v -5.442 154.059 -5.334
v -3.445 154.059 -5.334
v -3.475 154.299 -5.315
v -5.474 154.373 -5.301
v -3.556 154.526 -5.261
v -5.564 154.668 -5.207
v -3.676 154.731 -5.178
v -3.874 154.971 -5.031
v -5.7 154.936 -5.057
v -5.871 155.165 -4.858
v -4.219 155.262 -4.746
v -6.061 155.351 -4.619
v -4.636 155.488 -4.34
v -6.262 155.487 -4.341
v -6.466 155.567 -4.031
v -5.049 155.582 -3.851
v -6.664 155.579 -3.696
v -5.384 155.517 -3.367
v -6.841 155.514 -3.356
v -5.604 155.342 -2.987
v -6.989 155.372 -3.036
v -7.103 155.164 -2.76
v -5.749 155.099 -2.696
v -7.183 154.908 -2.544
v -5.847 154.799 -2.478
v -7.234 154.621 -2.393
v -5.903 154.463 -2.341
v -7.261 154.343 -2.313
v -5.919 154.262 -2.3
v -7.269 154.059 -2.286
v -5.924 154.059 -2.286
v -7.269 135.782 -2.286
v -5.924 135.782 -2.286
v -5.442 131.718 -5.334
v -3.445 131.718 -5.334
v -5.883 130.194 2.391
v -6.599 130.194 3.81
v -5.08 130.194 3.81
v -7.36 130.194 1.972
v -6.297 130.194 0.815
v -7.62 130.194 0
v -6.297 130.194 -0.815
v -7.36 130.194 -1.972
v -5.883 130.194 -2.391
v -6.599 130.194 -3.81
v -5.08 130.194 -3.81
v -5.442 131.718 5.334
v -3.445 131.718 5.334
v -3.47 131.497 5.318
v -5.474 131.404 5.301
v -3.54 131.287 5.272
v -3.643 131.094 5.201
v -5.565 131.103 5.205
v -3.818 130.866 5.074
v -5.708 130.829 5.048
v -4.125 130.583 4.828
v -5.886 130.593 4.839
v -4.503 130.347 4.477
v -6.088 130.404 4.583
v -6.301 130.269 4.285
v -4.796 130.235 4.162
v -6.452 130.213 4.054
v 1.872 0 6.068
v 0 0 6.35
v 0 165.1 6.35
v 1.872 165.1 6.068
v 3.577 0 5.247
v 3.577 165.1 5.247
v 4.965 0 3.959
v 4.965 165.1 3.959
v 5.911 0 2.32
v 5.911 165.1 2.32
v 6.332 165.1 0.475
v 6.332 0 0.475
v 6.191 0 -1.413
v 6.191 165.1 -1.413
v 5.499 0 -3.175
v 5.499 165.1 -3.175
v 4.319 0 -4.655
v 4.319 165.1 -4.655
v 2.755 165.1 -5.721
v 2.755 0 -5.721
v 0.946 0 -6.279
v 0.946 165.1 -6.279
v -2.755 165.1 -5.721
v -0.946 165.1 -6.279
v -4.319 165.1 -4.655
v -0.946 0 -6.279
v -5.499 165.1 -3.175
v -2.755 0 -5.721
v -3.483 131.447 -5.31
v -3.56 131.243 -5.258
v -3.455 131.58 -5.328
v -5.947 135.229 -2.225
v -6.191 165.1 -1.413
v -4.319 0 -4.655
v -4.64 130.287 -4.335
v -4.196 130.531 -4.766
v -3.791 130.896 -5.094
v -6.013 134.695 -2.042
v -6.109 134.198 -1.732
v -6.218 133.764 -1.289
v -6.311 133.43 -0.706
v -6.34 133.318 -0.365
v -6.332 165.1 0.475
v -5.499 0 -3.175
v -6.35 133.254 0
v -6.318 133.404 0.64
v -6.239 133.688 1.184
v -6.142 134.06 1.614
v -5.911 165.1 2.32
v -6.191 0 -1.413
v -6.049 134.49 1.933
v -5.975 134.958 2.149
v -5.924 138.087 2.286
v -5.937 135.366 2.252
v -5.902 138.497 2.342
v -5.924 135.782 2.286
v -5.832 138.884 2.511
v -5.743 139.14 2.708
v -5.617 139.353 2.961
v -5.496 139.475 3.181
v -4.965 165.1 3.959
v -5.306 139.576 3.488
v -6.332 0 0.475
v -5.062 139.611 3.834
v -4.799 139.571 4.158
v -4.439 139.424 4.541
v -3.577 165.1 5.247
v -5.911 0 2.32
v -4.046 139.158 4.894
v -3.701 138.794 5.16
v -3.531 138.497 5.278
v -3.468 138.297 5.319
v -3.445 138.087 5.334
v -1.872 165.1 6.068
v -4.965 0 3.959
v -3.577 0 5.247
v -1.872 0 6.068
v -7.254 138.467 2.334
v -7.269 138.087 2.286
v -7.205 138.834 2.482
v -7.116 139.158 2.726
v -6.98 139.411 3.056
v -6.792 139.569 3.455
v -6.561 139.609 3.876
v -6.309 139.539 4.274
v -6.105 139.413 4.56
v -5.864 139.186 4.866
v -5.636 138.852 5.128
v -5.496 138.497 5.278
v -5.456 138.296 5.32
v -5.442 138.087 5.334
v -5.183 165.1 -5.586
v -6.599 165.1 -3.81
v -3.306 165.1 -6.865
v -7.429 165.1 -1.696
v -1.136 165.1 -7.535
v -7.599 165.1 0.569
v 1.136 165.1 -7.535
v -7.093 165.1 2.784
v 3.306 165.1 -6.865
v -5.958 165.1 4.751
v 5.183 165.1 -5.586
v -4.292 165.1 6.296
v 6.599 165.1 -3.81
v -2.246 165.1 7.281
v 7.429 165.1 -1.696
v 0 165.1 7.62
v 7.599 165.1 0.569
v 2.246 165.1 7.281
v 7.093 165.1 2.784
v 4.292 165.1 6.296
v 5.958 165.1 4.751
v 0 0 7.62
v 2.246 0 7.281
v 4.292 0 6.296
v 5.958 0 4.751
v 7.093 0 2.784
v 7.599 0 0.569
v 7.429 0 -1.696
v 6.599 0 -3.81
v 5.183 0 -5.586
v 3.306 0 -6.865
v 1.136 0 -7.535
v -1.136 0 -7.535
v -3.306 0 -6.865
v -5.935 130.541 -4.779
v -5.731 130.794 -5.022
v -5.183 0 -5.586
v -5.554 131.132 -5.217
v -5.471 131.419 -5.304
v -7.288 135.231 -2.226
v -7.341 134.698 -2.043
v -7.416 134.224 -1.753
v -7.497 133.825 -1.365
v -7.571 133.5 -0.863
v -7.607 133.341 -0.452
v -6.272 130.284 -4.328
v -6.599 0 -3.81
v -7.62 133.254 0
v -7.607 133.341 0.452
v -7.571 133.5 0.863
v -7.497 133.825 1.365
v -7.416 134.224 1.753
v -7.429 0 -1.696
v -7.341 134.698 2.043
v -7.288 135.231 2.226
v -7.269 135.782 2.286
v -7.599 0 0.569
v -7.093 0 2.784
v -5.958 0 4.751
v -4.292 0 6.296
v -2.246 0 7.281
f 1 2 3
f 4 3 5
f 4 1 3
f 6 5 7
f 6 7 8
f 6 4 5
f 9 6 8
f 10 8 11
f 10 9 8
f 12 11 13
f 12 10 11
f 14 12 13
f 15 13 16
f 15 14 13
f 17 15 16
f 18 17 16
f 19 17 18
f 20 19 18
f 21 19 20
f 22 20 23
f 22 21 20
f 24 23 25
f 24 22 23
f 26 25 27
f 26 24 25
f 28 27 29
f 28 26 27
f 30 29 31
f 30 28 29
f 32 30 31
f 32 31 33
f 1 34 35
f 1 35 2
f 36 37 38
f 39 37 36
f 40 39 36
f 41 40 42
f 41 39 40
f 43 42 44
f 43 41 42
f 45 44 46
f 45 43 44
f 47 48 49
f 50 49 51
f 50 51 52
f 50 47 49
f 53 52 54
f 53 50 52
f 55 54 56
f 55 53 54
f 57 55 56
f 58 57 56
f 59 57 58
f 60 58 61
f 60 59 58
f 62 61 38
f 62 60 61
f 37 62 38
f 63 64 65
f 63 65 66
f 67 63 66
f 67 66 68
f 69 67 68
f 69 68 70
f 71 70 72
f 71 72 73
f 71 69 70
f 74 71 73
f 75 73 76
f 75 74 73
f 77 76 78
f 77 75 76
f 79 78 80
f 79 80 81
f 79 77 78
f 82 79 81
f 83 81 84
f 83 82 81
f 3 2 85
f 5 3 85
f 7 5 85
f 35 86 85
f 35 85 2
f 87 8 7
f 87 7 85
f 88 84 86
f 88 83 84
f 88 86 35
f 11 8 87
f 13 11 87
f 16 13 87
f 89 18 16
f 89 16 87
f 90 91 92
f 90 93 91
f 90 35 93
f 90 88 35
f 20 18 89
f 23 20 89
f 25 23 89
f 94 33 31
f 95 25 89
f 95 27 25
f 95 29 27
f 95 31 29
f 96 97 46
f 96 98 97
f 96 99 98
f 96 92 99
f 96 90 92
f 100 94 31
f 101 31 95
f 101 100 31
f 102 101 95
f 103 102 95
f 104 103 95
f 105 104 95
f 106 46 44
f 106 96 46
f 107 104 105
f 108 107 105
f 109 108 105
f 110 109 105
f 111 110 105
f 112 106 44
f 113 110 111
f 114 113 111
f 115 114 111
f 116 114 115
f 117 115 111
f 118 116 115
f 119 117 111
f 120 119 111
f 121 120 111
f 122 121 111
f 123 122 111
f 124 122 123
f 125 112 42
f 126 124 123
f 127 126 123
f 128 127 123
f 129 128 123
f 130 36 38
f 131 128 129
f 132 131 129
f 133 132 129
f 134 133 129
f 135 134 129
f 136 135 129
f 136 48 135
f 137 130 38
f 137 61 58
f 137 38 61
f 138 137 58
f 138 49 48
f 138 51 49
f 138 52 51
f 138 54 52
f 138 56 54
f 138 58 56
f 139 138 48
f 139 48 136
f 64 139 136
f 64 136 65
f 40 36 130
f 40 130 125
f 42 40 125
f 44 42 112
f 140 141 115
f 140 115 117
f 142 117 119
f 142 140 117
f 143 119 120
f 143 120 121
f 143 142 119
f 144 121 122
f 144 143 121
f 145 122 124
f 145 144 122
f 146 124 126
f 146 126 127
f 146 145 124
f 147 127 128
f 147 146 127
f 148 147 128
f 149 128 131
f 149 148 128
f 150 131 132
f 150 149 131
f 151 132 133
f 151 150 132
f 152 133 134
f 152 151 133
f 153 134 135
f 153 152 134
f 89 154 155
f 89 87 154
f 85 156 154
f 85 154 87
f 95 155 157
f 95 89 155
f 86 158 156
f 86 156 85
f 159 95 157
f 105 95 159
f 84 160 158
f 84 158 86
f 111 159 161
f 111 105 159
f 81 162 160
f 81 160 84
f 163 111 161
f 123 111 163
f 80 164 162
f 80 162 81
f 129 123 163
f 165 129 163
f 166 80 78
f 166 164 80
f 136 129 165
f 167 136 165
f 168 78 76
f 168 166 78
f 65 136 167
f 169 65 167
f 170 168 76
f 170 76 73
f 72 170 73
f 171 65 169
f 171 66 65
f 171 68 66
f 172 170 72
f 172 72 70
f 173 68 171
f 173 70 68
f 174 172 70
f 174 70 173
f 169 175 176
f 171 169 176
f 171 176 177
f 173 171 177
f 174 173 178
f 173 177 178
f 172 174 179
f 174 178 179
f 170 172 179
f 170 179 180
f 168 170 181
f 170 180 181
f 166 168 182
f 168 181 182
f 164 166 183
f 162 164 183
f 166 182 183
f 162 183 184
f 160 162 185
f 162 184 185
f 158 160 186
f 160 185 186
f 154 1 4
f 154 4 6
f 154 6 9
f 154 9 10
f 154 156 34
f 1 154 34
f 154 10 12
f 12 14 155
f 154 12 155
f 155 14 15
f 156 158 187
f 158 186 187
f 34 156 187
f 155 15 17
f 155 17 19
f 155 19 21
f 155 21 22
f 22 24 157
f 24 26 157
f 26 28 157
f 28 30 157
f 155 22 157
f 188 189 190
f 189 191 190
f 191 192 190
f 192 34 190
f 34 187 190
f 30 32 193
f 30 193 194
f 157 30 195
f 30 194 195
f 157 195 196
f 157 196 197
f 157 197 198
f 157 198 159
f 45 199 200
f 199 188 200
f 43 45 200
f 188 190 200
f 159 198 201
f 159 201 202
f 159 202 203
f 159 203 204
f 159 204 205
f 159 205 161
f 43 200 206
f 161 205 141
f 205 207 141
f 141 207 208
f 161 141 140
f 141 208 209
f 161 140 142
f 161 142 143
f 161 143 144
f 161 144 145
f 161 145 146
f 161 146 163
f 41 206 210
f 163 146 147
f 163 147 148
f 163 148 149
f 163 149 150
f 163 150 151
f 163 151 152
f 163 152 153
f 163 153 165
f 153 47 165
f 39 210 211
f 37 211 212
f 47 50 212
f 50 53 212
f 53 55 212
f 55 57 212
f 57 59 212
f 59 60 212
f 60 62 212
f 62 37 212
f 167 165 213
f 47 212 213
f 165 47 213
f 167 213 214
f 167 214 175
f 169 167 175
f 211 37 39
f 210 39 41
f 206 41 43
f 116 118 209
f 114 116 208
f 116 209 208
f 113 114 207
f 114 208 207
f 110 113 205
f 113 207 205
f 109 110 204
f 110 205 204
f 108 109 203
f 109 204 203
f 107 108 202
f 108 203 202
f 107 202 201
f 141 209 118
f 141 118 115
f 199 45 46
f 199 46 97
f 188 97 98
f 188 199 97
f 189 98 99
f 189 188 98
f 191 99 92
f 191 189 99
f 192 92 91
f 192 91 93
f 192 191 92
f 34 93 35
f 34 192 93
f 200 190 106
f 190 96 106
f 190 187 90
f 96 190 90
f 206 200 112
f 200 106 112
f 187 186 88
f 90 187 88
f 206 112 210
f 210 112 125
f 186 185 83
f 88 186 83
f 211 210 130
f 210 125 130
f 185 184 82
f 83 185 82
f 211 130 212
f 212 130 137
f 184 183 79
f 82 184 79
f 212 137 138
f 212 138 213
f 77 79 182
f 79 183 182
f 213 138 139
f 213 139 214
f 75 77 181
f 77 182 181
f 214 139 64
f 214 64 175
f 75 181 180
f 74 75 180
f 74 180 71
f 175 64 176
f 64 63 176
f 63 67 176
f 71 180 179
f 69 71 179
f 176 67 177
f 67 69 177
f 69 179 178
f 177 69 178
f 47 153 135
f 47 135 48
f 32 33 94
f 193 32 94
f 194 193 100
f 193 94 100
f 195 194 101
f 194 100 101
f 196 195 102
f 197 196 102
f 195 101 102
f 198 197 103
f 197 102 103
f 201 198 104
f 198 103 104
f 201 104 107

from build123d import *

# Parameters (mm, degrees)
SKETCH1_R               = 7.62
SKETCH1_R_2             = 6.35
BOSS_EXTRUDE1_DEPTH     = 165.1
CUT_EXTRUDE1_REACH      = 167.977
CUT_EXTRUDE1_END_RADIUS = 6.35
FILLET3_R               = 2.54


with BuildPart() as part:
    # Sketch1 → Boss-Extrude1 (new body)
    with BuildSketch(Plane(origin=(0, 0, 0), x_dir=(1, 0, 0), z_dir=(0, 1, 0))):
        with Locations(Location((0, 0, 0), (0, 0, 270))):
            Circle(SKETCH1_R)
        with Locations(Location((0, 0, 0), (0, 0, 270))):
            Circle(SKETCH1_R_2, mode=Mode.SUBTRACT)
    extrude(amount=BOSS_EXTRUDE1_DEPTH)

    # Cut-Extrude1: up to this cylinder (the profile starts outside it)
    cut_extrude1_end = Plane(origin=(0, 137.302889, 0), z_dir=(0, -1, 0)) * Cylinder(CUT_EXTRUDE1_END_RADIUS, 360.824706, mode=Mode.PRIVATE)
    # Sketch2 → Cut-Extrude1 (cut, up to the surface)
    with BuildSketch(Plane.ZY.offset(7.62), mode=Mode.PRIVATE) as cut_extrude1_sk1:
        with BuildLine():
            Line((-2.286, 154.058948498), (-2.286, 131.717535749))
            ThreePointArc((-2.286, 131.717535749), (-3.81, 130.193535749), (-5.334, 131.717535749))
            Line((-5.334, 131.717535749), (-5.334, 154.058948498))
            ThreePointArc((-5.334, 154.058948498), (-3.81, 155.582948498), (-2.286, 154.058948498))
        make_face()
    cut_extrude1_tool1 = extrude(cut_extrude1_sk1.sketch, amount=-CUT_EXTRUDE1_REACH, mode=Mode.PRIVATE) - cut_extrude1_end
    add(cut_extrude1_tool1.solids().sort_by_distance((-7.62, 142.888242, -3.81))[0], mode=Mode.SUBTRACT)
    # Sketch2 → Cut-Extrude1 (cut, up to the surface)
    with BuildSketch(Plane.ZY.offset(7.62), mode=Mode.PRIVATE) as cut_extrude1_sk2:
        with BuildLine():
            Line((2.286, 131.717535749), (2.286, 138.086901397))
            ThreePointArc((2.286, 138.086901397), (3.81, 139.610901397), (5.334, 138.086901397))
            Line((5.334, 138.086901397), (5.334, 131.717535749))
            ThreePointArc((5.334, 131.717535749), (3.81, 130.193535749), (2.286, 131.717535749))
        make_face()
    cut_extrude1_tool2 = extrude(cut_extrude1_sk2.sketch, amount=-CUT_EXTRUDE1_REACH, mode=Mode.PRIVATE) - cut_extrude1_end
    add(cut_extrude1_tool2.solids().sort_by_distance((-7.62, 134.902219, 3.81))[0], mode=Mode.SUBTRACT)
    # Sketch2 → Cut-Extrude1 (cut, up to the surface)
    with BuildSketch(Plane.ZY.offset(7.62), mode=Mode.PRIVATE) as cut_extrude1_sk3:
        with BuildLine():
            Line((-3.81, 133.241535749), (3.81, 133.241535749))
            ThreePointArc((3.81, 133.241535749), (5.334, 131.717535749), (3.81, 130.193535749))
            Line((3.81, 130.193535749), (-3.81, 130.193535749))
            ThreePointArc((-3.81, 130.193535749), (-5.334, 131.717535749), (-3.81, 133.241535749))
        make_face()
    cut_extrude1_tool3 = extrude(cut_extrude1_sk3.sketch, amount=-CUT_EXTRUDE1_REACH, mode=Mode.PRIVATE) - cut_extrude1_end
    add(cut_extrude1_tool3.solids().sort_by_distance((-7.62, 131.717536, 0))[0], mode=Mode.SUBTRACT)

    # Fillet3
    # the kernel refuses this fillet: 2.54 mm, written as the material it takes off along each edge
    with BuildSketch(Plane(origin=(-13.619016715, 133.241535749, 2.286), x_dir=(0, 0, -1), z_dir=(1, 0, 0)), Plane(origin=(0.425752875, 133.241535749, -2.286), x_dir=(0, 0, 1), z_dir=(-1, 0, 0))) as fillet3_piece_1:
        with BuildLine():
            CenterArc((FILLET3_R, FILLET3_R), FILLET3_R, 180, 90)
            Line((0, FILLET3_R), (0, 0))
            Line((0, 0), (FILLET3_R, 0))
        make_face()
    extrude(amount=14.04476959, mode=Mode.SUBTRACT)


solid = part.part
